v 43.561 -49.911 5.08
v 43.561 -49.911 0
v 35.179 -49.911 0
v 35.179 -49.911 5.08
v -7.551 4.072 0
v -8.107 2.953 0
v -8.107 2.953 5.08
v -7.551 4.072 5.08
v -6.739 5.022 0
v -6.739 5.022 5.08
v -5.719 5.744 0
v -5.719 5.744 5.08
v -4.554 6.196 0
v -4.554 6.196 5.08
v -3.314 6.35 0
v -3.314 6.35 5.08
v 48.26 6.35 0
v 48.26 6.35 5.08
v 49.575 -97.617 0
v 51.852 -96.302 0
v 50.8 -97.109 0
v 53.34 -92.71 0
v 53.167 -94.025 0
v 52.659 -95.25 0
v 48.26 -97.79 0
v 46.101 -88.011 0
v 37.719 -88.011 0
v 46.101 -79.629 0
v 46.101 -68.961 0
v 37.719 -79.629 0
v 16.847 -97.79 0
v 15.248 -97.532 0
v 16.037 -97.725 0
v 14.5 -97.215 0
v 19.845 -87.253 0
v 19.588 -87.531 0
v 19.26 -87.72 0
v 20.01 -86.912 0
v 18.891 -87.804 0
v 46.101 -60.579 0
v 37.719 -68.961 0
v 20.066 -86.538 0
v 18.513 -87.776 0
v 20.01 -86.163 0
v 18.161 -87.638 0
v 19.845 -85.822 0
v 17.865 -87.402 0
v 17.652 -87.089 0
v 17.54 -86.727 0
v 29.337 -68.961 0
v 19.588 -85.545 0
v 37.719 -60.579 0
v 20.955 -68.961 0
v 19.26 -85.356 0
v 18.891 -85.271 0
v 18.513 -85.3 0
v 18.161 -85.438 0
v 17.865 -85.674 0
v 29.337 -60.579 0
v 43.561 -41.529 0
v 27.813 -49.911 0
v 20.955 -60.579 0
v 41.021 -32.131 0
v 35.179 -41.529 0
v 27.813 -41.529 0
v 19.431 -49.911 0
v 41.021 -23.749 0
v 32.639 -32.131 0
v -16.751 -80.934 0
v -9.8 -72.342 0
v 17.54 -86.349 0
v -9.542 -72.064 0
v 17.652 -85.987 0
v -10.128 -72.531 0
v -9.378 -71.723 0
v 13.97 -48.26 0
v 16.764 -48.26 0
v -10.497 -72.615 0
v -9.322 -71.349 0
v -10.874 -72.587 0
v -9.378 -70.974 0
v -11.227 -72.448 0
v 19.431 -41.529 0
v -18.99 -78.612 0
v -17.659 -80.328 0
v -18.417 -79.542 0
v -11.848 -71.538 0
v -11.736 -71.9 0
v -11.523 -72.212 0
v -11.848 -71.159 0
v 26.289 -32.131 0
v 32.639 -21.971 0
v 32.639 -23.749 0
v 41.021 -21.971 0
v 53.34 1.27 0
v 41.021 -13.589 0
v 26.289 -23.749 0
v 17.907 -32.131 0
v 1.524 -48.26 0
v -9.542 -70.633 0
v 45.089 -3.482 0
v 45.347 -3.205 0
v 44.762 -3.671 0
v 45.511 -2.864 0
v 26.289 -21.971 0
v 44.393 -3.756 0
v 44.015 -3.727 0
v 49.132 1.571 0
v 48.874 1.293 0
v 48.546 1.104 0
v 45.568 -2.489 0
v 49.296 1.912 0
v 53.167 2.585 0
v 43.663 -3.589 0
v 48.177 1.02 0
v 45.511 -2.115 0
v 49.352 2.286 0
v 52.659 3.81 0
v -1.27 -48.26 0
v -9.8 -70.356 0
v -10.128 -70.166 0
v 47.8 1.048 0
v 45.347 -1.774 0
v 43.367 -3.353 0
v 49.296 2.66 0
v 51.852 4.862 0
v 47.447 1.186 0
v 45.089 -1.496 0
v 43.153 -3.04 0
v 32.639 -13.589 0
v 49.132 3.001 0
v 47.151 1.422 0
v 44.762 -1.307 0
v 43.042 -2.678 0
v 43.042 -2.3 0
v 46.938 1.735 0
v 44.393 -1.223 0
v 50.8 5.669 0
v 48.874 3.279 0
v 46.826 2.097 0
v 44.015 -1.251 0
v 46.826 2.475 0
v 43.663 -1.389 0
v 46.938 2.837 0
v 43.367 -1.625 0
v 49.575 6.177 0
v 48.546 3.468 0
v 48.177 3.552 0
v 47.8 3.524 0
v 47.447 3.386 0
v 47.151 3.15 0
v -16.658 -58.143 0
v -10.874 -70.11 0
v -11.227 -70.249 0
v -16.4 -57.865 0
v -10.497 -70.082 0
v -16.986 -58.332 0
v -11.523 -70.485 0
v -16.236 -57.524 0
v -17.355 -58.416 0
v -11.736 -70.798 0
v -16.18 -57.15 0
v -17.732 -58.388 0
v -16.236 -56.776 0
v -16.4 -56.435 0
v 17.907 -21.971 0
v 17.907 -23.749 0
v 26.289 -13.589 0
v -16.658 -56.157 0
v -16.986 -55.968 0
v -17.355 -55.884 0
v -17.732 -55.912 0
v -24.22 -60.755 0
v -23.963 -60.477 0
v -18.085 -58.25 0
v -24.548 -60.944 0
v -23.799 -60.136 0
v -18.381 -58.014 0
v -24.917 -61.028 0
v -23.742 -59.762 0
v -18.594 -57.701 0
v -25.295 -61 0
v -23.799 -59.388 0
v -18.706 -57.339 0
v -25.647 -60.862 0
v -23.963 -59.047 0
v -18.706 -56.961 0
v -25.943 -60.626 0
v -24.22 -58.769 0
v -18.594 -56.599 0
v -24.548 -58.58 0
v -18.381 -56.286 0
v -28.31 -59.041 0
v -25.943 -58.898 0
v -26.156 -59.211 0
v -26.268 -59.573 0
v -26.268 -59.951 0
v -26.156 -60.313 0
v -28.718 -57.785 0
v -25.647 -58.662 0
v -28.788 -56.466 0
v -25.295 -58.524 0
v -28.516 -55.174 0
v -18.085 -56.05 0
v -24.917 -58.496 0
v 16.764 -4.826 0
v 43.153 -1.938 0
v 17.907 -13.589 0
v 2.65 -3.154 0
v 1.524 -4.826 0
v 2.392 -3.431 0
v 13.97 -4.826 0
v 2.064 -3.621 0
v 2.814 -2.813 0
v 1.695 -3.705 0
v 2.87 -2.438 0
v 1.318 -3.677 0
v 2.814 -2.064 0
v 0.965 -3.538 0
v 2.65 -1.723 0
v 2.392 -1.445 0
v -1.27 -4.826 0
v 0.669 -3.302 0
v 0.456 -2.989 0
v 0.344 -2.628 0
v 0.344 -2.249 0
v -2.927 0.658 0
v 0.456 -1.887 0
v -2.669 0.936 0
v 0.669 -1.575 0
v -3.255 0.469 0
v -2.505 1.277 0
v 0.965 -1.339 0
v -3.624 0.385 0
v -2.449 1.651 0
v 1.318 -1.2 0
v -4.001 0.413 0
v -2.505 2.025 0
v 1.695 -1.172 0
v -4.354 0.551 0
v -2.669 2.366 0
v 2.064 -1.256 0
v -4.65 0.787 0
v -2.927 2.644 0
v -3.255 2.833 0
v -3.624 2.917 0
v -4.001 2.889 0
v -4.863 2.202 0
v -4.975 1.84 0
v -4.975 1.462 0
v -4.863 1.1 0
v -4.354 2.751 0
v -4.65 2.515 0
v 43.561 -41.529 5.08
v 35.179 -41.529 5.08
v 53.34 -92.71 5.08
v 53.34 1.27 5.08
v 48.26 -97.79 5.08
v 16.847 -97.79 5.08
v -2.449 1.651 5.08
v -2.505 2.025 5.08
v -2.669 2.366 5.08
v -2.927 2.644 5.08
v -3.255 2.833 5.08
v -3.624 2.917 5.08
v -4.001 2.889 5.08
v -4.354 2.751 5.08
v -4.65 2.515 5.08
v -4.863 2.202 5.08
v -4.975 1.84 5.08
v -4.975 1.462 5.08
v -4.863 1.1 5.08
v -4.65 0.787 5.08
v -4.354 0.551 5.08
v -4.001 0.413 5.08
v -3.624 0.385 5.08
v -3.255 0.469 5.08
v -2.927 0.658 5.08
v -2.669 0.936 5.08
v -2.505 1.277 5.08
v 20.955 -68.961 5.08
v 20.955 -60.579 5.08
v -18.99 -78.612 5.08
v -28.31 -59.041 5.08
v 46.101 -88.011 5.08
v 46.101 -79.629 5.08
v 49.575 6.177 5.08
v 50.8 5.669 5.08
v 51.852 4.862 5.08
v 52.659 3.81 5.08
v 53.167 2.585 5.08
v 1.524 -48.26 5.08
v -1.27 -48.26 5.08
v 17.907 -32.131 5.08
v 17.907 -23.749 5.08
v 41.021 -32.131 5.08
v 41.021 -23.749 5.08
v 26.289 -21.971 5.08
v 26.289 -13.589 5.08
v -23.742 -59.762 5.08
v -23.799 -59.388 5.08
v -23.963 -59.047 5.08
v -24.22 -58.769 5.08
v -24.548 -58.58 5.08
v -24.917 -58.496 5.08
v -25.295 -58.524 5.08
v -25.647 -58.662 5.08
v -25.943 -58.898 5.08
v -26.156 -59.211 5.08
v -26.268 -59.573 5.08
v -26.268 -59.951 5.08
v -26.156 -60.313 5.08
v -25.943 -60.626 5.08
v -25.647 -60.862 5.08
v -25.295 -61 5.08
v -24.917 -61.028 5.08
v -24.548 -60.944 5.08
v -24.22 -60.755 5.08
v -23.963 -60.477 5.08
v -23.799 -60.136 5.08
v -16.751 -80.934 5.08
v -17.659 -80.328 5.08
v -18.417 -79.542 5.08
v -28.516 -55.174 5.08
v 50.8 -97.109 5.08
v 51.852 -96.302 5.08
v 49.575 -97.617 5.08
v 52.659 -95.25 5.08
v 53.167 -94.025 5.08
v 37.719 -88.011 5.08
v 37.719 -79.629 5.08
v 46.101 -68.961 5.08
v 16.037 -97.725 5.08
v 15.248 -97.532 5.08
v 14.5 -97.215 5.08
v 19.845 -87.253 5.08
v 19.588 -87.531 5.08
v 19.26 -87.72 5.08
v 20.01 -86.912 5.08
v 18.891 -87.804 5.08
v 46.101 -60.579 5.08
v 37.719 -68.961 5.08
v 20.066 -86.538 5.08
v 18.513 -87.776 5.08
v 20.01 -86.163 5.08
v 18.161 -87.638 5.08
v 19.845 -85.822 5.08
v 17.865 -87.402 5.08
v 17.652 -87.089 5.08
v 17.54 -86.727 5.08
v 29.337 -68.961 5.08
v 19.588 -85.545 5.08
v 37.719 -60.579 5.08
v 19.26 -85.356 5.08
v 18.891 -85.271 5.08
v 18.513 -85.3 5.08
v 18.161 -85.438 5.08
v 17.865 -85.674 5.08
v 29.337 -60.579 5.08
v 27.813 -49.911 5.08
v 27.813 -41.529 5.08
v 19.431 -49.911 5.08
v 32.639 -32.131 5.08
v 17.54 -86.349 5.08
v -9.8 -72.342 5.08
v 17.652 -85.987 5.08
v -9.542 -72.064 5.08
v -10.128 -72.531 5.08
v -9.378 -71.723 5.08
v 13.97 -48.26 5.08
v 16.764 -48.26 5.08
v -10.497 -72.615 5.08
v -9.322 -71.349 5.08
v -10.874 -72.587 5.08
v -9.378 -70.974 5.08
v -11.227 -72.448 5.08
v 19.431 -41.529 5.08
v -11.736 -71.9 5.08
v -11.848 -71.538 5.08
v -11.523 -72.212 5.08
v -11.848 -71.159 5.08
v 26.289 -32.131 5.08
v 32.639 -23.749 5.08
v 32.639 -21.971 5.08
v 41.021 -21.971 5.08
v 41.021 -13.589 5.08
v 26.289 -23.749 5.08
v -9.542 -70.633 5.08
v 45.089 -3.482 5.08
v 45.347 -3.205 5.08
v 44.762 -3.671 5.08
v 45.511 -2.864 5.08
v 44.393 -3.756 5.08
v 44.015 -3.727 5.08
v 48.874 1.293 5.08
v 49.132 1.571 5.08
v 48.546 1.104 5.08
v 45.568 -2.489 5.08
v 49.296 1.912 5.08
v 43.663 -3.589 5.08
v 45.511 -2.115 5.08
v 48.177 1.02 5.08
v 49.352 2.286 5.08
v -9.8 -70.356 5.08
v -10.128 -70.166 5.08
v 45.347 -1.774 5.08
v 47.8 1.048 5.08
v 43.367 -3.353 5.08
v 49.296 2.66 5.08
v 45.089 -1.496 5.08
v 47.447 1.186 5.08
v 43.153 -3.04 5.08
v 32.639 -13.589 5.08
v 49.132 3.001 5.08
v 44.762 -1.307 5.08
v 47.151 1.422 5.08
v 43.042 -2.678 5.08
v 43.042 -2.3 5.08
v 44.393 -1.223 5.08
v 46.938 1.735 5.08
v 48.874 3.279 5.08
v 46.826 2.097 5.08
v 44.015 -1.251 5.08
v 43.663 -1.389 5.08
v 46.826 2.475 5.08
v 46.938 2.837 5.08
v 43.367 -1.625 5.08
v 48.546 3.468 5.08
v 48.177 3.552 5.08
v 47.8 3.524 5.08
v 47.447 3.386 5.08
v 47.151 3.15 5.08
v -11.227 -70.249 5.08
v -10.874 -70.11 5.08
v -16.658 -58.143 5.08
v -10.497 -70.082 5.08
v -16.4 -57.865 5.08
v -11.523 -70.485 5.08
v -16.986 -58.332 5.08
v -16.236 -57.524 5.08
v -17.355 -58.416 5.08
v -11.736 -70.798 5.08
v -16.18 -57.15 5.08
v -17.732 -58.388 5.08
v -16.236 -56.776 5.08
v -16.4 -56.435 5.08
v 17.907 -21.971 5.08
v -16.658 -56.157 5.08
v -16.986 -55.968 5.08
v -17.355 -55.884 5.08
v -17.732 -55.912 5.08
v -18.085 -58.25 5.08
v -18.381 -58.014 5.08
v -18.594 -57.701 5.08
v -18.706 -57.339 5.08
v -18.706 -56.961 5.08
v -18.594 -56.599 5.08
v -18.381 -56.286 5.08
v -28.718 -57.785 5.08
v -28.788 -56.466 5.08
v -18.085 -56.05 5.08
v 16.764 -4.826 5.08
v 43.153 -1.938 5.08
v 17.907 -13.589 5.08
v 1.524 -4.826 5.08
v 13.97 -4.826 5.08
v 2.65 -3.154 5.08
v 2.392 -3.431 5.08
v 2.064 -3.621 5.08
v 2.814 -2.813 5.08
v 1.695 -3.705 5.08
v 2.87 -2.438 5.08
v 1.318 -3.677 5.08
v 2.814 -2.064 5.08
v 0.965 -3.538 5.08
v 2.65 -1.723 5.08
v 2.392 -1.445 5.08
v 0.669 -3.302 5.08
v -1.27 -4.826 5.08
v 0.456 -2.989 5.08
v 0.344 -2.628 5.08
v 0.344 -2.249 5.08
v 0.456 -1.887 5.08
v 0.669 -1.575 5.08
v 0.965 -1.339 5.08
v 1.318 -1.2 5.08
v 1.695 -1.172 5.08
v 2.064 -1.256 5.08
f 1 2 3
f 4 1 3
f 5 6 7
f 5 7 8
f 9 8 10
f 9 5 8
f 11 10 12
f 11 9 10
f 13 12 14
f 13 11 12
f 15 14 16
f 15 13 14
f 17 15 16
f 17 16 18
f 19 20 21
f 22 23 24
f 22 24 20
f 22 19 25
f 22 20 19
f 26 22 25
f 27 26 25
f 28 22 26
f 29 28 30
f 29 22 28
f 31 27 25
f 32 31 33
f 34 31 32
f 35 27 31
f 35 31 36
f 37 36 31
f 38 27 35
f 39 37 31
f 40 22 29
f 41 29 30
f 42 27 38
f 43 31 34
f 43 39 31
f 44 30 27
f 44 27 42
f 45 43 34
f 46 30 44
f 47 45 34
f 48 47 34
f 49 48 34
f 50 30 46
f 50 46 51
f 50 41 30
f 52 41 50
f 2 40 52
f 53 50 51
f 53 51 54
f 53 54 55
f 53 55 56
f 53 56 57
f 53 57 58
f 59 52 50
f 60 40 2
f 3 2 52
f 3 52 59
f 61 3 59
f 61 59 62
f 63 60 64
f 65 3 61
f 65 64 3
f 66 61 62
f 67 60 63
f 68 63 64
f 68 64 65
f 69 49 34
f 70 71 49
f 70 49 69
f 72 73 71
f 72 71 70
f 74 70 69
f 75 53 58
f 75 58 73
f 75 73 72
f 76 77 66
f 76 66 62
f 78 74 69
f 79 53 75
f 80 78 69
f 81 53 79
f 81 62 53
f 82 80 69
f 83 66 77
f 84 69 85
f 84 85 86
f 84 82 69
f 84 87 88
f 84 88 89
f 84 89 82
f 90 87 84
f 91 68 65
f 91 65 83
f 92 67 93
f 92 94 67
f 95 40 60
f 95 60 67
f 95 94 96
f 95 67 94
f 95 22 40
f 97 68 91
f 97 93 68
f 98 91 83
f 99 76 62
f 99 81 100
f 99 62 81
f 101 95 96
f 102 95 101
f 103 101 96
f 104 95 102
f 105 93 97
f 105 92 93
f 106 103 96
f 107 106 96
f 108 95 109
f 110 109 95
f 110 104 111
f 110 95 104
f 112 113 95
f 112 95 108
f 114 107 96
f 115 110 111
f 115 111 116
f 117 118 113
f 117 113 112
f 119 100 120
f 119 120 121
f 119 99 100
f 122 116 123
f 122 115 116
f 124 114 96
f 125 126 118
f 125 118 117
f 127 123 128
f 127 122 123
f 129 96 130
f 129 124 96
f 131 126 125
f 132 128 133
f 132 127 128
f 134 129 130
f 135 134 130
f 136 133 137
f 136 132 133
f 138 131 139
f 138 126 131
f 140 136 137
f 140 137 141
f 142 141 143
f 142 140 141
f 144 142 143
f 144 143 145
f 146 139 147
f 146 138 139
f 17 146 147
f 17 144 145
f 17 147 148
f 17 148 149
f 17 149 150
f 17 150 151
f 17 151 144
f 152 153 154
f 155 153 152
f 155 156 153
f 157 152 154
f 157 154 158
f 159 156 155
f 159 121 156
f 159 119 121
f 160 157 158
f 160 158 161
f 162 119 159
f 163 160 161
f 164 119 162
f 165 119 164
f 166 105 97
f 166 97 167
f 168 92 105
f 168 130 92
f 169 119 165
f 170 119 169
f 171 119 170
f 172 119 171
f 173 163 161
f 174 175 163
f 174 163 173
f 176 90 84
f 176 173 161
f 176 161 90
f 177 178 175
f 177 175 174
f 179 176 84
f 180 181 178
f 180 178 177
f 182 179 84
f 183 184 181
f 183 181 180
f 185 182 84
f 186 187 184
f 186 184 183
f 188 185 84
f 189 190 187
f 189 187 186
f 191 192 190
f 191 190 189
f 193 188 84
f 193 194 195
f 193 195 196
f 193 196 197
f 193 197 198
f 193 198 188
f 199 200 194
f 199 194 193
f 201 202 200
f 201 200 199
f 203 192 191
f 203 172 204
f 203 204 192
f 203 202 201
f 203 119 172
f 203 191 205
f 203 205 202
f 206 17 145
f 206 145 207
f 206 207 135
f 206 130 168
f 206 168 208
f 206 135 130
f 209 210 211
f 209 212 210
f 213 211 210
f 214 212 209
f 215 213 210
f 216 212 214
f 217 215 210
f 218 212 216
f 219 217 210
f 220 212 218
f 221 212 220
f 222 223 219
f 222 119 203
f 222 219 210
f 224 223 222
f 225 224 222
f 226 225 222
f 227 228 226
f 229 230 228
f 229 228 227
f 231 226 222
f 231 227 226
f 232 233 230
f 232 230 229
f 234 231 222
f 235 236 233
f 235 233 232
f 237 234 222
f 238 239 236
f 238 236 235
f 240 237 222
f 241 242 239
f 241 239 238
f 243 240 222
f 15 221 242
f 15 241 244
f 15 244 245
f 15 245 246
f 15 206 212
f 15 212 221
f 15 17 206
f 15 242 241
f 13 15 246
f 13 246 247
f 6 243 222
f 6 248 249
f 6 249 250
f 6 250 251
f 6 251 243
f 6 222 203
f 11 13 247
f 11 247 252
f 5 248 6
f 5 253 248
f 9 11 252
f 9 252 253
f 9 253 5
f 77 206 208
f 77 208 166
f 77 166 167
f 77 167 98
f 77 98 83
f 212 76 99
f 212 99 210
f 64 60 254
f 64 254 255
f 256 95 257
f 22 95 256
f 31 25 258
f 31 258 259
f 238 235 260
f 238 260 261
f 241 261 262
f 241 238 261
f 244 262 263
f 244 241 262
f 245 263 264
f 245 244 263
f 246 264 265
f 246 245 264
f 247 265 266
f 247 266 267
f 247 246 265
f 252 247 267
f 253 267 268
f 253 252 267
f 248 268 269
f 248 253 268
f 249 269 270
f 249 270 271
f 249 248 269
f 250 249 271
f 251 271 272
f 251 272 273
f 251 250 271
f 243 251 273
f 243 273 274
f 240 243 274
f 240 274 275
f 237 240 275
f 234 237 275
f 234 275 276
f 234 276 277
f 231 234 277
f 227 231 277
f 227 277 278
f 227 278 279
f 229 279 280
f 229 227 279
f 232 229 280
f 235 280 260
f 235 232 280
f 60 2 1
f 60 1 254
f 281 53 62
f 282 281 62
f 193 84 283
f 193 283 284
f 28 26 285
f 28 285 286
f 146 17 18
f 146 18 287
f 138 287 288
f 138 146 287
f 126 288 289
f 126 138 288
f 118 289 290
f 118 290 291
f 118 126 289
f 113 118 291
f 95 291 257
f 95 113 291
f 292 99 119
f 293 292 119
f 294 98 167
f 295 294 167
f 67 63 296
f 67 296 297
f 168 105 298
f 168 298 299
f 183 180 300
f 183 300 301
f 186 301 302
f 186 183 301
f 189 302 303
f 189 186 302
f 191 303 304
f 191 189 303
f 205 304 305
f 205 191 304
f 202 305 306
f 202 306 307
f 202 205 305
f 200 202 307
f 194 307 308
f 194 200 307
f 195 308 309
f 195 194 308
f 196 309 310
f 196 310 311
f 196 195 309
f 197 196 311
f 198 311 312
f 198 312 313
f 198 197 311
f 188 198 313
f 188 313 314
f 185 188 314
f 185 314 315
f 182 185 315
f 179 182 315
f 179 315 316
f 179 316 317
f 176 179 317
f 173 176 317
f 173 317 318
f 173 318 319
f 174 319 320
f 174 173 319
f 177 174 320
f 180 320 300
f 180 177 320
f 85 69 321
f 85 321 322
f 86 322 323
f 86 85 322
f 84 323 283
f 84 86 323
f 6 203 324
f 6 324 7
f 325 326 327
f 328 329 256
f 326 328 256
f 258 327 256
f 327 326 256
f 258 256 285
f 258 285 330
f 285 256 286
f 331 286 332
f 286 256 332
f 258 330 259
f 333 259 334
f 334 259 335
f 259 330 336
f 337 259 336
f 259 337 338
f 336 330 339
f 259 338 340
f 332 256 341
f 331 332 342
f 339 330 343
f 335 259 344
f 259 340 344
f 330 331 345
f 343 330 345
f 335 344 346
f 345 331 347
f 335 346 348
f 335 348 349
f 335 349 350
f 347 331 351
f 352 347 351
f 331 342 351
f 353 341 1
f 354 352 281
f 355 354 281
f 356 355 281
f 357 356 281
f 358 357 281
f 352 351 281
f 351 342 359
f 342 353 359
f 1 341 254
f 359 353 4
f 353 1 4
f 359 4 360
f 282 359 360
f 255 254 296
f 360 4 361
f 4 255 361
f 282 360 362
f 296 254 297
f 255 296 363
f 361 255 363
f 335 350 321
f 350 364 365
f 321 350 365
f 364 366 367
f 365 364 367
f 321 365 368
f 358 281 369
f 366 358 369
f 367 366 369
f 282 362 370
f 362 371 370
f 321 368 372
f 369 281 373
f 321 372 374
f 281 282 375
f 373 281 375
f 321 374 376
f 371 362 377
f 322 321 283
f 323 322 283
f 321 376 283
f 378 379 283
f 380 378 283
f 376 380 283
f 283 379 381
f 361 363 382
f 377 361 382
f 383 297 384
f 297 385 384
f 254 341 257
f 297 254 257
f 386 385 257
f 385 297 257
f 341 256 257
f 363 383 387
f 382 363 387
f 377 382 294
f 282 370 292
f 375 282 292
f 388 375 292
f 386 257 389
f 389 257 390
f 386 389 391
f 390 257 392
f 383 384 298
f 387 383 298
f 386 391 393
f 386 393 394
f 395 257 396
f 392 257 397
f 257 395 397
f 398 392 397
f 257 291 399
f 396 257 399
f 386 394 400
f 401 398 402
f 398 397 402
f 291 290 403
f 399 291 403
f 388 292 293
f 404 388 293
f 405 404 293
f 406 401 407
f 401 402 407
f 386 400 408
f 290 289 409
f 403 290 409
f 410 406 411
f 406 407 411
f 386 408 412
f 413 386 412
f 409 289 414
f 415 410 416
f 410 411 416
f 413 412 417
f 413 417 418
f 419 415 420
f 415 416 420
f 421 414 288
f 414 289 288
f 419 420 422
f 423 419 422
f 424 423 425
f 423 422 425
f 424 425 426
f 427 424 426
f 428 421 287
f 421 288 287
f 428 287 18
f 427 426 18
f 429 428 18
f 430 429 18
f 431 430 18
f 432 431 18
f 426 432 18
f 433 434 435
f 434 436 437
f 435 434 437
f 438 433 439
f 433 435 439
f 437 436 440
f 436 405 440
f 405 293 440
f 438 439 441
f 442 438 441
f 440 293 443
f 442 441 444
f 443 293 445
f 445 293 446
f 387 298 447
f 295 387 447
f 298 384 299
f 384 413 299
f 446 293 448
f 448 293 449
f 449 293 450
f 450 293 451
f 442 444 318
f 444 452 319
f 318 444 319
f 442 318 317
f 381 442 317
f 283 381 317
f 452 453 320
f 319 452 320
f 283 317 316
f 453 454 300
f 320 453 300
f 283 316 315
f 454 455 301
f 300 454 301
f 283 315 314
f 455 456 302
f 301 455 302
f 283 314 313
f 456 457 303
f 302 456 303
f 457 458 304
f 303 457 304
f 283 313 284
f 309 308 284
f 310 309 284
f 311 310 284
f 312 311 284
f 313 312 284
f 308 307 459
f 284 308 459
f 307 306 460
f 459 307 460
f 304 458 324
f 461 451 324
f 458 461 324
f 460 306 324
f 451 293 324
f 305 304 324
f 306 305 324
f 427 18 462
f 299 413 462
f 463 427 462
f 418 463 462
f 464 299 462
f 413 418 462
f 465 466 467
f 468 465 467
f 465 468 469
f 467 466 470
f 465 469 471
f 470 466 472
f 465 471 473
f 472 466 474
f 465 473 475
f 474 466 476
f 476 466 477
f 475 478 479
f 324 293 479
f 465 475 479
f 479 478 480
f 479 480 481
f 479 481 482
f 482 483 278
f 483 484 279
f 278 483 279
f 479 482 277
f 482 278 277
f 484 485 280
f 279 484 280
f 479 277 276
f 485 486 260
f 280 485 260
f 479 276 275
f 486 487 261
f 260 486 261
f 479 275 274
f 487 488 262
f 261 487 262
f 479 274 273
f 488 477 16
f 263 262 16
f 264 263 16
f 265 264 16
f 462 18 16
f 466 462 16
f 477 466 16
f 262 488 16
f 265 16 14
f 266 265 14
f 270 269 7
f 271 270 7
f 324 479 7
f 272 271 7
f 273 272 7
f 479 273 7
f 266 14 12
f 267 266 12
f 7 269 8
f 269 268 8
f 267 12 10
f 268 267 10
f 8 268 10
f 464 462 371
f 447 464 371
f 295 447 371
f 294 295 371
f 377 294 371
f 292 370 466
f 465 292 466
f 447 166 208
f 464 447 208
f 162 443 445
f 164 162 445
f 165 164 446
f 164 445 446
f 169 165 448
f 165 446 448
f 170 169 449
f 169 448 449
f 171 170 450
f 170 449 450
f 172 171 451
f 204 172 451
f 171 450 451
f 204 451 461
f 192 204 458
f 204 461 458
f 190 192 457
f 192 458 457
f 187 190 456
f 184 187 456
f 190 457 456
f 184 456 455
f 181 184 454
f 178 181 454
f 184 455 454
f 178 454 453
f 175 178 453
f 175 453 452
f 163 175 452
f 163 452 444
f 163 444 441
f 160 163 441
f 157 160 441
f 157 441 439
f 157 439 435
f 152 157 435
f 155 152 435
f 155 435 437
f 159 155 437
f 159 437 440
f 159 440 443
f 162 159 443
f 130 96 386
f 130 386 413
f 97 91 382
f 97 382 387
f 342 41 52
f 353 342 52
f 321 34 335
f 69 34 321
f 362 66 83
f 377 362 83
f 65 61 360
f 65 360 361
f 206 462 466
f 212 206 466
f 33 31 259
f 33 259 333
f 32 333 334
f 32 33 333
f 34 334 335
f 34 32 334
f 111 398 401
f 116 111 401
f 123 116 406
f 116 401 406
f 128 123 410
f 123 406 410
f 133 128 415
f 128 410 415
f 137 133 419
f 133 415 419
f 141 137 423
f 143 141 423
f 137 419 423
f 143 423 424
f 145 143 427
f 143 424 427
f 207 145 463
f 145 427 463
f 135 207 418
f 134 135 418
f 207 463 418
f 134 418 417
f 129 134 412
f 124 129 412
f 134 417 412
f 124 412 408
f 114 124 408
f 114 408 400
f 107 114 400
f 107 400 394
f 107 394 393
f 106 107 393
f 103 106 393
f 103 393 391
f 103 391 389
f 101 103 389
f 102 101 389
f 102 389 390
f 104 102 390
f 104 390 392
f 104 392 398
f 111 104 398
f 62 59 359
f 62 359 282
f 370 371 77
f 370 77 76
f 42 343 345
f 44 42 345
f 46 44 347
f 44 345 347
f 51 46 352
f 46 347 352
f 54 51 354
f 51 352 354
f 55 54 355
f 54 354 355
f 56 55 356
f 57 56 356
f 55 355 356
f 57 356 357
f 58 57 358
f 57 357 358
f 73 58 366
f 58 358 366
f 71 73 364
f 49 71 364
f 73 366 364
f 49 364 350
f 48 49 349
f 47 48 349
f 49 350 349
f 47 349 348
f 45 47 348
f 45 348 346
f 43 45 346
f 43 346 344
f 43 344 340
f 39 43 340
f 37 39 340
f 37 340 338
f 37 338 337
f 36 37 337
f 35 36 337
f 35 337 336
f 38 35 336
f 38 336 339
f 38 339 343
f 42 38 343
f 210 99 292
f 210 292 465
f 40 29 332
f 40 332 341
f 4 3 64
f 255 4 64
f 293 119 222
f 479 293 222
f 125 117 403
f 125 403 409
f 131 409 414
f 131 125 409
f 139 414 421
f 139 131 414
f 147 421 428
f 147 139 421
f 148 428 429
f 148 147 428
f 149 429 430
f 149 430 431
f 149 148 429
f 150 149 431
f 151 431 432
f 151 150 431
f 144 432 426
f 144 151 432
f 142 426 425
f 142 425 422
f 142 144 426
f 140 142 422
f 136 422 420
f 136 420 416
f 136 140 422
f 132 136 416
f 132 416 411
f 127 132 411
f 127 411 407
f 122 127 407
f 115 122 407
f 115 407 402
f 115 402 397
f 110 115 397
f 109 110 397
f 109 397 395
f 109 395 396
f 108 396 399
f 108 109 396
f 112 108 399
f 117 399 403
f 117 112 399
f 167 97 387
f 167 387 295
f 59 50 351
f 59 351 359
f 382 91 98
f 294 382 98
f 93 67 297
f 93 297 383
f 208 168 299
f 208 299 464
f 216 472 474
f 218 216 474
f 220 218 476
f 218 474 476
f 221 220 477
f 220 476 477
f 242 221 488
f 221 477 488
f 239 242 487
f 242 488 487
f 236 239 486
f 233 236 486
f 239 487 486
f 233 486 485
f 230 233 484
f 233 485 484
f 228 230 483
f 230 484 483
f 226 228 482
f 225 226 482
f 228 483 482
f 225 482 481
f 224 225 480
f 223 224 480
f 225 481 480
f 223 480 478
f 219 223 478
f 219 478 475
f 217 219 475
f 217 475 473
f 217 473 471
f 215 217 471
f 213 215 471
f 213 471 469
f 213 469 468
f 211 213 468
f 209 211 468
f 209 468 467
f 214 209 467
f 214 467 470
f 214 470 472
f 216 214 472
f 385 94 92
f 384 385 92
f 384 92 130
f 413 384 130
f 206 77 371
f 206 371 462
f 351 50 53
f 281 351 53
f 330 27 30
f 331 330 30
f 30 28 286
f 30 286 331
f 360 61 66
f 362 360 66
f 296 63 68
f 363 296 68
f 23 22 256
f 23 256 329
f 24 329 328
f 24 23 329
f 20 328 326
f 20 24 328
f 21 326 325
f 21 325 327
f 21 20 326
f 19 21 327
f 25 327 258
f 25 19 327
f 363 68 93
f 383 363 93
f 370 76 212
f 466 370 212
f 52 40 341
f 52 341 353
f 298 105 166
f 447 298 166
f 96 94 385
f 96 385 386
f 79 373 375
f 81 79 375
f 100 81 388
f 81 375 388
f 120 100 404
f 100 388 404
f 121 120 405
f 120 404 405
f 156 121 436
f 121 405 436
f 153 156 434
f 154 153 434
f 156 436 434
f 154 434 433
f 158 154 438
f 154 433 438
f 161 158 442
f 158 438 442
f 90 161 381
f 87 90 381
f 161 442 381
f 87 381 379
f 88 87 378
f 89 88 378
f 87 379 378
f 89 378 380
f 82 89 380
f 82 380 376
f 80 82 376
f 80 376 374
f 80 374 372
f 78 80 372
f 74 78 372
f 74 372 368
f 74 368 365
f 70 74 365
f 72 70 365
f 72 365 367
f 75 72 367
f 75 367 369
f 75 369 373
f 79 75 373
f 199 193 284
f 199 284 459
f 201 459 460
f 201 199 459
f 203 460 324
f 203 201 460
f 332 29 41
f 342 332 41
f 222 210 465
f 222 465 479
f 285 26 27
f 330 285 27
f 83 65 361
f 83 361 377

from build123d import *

# Parameters (mm, degrees)
SKETCH1_R           = 1.27
BOSS_EXTRUDE1_DEPTH = 5.08
SKETCH5_W           = 8.382
SKETCH5_H           = 8.382
SKETCH5_W_2         = 2.794
SKETCH5_H_2         = 43.434
CUT_EXTRUDE1_DEPTH  = 6.08
SKETCH7_R           = 1.27
CUT_EXTRUDE3_DEPTH  = 6.08


with BuildPart() as part:
    # Sketch1 → Boss-Extrude1 (new body)
    with BuildSketch(Plane.XY):
        with BuildLine():
            Line((-3.314058103, 6.35), (48.26, 6.35))
            ThreePointArc((48.26, 6.35), (51.852102448, 4.862102448), (53.34, 1.27))
            Line((53.34, 1.27), (53.34, -92.71))
            ThreePointArc((53.34, -92.71), (51.852102448, -96.302102448), (48.26, -97.79))
            Line((48.26, -97.79), (16.846989059, -97.79))
            ThreePointArc((16.846989059, -97.79), (15.638688158, -97.644208035), (14.499741809, -97.215200367))
            Line((14.499741809, -97.215200367), (-16.7505185, -80.933552139))
            ThreePointArc((-16.7505185, -80.933552139), (-18.059258376, -79.955412607), (-18.989802686, -78.61241436))
            Line((-18.989802686, -78.61241436), (-28.309569459, -59.040904135))
            ThreePointArc((-28.309569459, -59.040904135), (-28.795802898, -57.127870198), (-28.51617555, -55.173917704))
            Line((-28.51617555, -55.173917704), (-8.107195629, 2.952923842))
            ThreePointArc((-8.107195629, 2.952923842), (-6.251501454, 5.414614163), (-3.314058103, 6.35))
        make_face()
        with Locations((48.0822, 2.286)):
            Circle(SKETCH1_R, mode=Mode.SUBTRACT)
        with Locations((-3.718687848, 1.651)):
            Circle(SKETCH1_R, mode=Mode.SUBTRACT)
        with Locations((-25.012261453, -59.761967182)):
            Circle(SKETCH1_R, mode=Mode.SUBTRACT)
    extrude(amount=BOSS_EXTRUDE1_DEPTH)

    # Sketch5 → Cut-Extrude1 (cut, through all)
    with BuildSketch(Plane(origin=(0, 0, 0), x_dir=(-1, 0, 0), z_dir=(0, 0, -1))):
        with Locations((-36.83, -17.78)):
            Rectangle(SKETCH5_W, SKETCH5_H)
        with Locations((-39.37, -45.72)):
            Rectangle(SKETCH5_W, SKETCH5_H)
        with Locations((-36.83, -27.94)):
            Rectangle(SKETCH5_W, SKETCH5_H)
        with Locations((-41.91, -64.77)):
            Rectangle(SKETCH5_W, SKETCH5_H)
        with Locations((-41.91, -83.82)):
            Rectangle(SKETCH5_W, SKETCH5_H)
        with Locations((-22.098, -17.78)):
            Rectangle(SKETCH5_W, SKETCH5_H)
        with Locations((-22.098, -27.94)):
            Rectangle(SKETCH5_W, SKETCH5_H)
        with Locations((-23.622, -45.72)):
            Rectangle(SKETCH5_W, SKETCH5_H)
        with Locations((-25.146, -64.77)):
            Rectangle(SKETCH5_W, SKETCH5_H)
        with Locations((-15.367, -26.543)):
            Rectangle(SKETCH5_W_2, SKETCH5_H_2)
        with Locations((-0.127, -26.543)):
            Rectangle(SKETCH5_W_2, SKETCH5_H_2)
    extrude(amount=-CUT_EXTRUDE1_DEPTH, mode=Mode.SUBTRACT)

    # Sketch7 → Cut-Extrude3 (cut, through all)
    with BuildSketch(Plane.XY.offset(5.08)):
        with Locations((44.2976, -2.4892)):
            Circle(SKETCH7_R)
        with Locations((1.6002, -2.4384)):
            Circle(SKETCH7_R)
        with Locations((-17.4498, -57.15)):
            Circle(SKETCH7_R)
        with Locations((-10.5918, -71.3486)):
            Circle(SKETCH7_R)
        with Locations((18.796, -86.5378)):
            Circle(SKETCH7_R)
    extrude(amount=-CUT_EXTRUDE3_DEPTH, mode=Mode.SUBTRACT)


solid = part.part
